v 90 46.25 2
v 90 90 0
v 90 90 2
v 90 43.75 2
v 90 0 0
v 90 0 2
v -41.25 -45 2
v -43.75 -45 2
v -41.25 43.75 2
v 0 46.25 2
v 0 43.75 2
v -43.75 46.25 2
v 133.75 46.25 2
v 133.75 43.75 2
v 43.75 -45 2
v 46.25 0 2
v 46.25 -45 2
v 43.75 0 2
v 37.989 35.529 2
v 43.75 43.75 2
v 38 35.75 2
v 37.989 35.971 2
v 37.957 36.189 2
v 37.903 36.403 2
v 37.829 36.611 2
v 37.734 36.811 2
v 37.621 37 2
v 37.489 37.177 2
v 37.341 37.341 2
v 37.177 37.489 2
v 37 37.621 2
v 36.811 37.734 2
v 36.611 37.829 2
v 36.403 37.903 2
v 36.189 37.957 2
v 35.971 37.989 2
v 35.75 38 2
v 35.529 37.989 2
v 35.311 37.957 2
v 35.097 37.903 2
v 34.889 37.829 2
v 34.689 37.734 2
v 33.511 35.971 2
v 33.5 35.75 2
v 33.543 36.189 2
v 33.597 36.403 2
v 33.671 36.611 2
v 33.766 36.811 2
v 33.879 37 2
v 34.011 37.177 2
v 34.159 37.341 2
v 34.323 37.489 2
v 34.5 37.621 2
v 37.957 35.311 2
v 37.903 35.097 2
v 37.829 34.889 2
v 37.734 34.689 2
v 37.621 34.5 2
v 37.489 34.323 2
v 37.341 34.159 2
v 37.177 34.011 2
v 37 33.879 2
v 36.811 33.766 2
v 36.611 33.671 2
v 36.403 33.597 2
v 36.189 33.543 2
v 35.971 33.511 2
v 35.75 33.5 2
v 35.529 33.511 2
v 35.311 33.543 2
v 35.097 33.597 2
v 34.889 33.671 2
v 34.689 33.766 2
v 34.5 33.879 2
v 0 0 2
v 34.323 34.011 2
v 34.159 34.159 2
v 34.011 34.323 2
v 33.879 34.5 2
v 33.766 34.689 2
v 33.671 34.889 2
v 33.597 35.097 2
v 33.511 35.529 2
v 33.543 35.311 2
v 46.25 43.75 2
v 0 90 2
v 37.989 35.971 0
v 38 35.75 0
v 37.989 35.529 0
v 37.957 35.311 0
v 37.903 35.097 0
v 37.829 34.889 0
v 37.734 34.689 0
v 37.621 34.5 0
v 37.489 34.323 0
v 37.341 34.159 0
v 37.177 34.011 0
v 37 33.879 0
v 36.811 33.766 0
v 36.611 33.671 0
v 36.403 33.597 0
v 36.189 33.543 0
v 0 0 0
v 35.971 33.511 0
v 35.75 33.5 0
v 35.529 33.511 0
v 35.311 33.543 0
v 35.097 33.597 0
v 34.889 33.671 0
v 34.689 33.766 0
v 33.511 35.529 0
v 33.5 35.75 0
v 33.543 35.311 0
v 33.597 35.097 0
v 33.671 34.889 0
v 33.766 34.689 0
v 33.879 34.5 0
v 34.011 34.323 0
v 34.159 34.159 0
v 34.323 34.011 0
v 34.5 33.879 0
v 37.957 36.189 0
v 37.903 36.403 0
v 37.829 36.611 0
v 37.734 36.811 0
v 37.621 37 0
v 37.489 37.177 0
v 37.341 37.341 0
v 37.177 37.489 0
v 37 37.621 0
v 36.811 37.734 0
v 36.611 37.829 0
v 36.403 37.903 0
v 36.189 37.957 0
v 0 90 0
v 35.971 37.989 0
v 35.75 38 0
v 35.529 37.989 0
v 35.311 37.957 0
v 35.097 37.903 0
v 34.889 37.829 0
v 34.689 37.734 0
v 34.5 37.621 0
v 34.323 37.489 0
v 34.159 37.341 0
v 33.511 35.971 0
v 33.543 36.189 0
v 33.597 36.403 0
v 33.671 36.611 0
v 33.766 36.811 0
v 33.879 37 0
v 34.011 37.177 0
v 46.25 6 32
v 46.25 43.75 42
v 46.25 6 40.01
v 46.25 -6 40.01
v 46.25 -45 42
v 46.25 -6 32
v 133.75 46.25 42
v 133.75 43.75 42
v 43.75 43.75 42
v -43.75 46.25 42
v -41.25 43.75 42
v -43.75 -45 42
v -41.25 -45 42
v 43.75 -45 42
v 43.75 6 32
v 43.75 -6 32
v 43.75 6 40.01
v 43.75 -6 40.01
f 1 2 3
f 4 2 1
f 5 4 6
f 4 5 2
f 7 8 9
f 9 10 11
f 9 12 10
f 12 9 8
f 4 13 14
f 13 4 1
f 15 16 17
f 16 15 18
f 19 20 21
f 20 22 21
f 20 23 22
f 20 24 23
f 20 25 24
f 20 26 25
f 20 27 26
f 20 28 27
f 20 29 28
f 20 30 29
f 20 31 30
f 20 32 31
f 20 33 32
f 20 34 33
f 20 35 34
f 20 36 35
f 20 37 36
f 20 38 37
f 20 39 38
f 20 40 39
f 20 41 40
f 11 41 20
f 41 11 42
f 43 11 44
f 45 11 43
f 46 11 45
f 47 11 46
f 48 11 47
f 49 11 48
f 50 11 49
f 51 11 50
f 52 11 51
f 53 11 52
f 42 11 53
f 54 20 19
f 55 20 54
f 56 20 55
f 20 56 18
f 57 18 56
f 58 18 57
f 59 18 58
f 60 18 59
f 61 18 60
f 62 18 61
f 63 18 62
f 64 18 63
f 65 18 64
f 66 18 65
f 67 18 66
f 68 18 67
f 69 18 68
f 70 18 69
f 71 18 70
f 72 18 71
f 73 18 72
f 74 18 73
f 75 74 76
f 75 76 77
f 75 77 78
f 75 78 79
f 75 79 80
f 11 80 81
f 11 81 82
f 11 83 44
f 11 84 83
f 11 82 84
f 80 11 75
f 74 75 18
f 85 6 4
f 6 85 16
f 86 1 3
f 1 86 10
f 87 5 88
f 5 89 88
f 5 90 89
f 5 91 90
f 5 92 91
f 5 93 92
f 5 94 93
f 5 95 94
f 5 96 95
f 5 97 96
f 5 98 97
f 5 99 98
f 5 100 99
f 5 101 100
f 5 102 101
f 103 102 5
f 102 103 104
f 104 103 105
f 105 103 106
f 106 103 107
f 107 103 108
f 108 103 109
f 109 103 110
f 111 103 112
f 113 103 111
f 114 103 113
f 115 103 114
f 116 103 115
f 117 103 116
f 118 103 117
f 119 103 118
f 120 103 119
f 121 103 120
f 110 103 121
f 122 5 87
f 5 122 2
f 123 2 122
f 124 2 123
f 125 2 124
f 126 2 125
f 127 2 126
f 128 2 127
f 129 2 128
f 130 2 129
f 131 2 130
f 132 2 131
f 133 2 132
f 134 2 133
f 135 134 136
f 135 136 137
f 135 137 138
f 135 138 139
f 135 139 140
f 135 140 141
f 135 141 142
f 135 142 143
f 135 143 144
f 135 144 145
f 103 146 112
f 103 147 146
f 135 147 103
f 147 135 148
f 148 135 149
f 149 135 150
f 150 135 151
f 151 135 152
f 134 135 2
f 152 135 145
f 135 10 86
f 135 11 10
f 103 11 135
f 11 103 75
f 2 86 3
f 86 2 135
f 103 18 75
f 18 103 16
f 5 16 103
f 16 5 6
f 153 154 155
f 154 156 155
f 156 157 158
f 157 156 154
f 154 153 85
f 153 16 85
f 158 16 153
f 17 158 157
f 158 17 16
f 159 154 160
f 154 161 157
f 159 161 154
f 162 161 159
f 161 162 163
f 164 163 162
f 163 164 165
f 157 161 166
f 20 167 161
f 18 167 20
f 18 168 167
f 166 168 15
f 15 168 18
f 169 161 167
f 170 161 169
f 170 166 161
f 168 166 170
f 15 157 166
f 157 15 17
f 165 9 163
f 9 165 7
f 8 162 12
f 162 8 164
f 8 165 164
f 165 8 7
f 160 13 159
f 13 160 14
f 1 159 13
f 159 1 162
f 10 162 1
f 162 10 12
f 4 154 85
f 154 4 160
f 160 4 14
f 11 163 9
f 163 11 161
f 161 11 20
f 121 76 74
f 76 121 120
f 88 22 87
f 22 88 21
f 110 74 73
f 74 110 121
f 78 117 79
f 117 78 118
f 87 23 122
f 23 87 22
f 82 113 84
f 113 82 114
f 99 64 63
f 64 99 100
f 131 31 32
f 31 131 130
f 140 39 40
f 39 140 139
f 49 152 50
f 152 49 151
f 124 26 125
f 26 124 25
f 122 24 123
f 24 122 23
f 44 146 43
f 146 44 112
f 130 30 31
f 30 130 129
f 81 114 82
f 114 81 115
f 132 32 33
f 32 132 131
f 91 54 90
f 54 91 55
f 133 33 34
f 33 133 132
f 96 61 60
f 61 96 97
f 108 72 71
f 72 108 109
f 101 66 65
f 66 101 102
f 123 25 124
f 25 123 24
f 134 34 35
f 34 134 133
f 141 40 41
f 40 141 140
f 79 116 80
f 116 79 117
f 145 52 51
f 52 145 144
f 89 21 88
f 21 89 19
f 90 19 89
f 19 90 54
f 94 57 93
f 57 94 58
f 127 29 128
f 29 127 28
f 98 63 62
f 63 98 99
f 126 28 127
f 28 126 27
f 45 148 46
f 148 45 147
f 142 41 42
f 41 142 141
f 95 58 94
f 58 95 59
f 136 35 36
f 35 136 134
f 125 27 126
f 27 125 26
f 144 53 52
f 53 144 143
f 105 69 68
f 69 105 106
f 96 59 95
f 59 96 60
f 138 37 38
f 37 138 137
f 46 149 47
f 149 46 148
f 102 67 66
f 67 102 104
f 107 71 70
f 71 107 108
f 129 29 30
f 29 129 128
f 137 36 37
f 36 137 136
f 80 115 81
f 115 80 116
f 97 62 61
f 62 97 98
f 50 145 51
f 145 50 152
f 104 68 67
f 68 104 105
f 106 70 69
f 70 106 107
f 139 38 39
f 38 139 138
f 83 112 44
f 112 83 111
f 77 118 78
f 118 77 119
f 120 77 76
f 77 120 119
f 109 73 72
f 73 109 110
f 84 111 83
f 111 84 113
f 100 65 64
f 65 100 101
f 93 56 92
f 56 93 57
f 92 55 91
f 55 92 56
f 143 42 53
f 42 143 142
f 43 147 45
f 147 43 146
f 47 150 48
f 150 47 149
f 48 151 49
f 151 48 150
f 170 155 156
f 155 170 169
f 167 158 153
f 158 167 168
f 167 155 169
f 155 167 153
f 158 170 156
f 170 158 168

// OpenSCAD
// DIY Magnetic Stirrer Housing - designed for an 80mm PC fan.
// Orientation: Top plate on bed (z=0), walls rising to z=40.
// Outer size: 90x90mm. Fan size: 80x80mm.

$fn = 64;

// Dimensions
outer_w = 90;
outer_h = 90;
top_t   = 2;
wall_t  = 2.5;
wall_h  = 40; // Total height from bed to open top

// Fan mounting hole pattern
hole_d  = 4.5;
pattern_size = 71.5;

// Cable notch
notch_w = 12;
notch_start_z = 32; // Bottom of notch
notch_end_z = 40;   // Top of notch (open edge)

// Calculate positions
// Top plate sits at z=0, so its top surface is at z=top_t.
// Walls sit on top of the plate, so their base is at z=top_t.
// Walls extend to z = top_t + wall_h.

// Hole positions (centred on origin)
hole_x = pattern_size / 2;
hole_y = pattern_size / 2;

// Notch position (in one wall, e.g., +X wall)
notch_x = outer_w / 2 - notch_w / 2;
notch_y = 0;

module main_housing() {
    difference() {
        // 1. Create the solid box (Top plate + Walls)
        union() {
            // Top plate (90x90x2)
            translate([0, 0, 0]) 
                cube([outer_w, outer_h, top_t]);
            
            // Four walls rising from the top plate
            // Wall 1: +X side
            translate([outer_w / 2 - wall_t / 2, -outer_h / 2, top_t])
                cube([wall_t, outer_h, wall_h]);
            
            // Wall 2: -X side
            translate([-outer_w / 2 + wall_t / 2, -outer_h / 2, top_t])
                cube([wall_t, outer_h, wall_h]);
            
            // Wall 3: +Y side
            translate([outer_w / 2 - wall_t / 2, outer_h / 2 - wall_t / 2, top_t])
                cube([outer_w, wall_t, wall_h]);
            
            // Wall 4: -Y side
            translate([-outer_w / 2 + wall_t / 2, outer_h / 2 - wall_t / 2, top_t])
                cube([outer_w, wall_t, wall_h]);
        }
        
        // 2. Cut the four mounting holes through the top plate
        // Holes go from z=0 to z=top_t + 0.01 to ensure clean cut
        for (i = [0 : 3]) {
            translate([
                i % 2 == 0 ? hole_x : -hole_x,
                i < 2 ? hole_y : -hole_y,
                0
            ]) {
                cylinder(h = top_t + 0.01, d = hole_d);
            }
        }
        
        // 3. Cut the cable notch in the +X wall
        // The notch is in the wall at x = outer_w/2 - wall_t/2
        // It goes from z = notch_start_z to z = notch_end_z
        // Width is notch_w, centered at y=0
        translate([notch_x, -notch_w / 2, notch_start_z])
            cube([notch_w, notch_w, notch_end_z - notch_start_z + 0.01]);
    }
}

main_housing();
